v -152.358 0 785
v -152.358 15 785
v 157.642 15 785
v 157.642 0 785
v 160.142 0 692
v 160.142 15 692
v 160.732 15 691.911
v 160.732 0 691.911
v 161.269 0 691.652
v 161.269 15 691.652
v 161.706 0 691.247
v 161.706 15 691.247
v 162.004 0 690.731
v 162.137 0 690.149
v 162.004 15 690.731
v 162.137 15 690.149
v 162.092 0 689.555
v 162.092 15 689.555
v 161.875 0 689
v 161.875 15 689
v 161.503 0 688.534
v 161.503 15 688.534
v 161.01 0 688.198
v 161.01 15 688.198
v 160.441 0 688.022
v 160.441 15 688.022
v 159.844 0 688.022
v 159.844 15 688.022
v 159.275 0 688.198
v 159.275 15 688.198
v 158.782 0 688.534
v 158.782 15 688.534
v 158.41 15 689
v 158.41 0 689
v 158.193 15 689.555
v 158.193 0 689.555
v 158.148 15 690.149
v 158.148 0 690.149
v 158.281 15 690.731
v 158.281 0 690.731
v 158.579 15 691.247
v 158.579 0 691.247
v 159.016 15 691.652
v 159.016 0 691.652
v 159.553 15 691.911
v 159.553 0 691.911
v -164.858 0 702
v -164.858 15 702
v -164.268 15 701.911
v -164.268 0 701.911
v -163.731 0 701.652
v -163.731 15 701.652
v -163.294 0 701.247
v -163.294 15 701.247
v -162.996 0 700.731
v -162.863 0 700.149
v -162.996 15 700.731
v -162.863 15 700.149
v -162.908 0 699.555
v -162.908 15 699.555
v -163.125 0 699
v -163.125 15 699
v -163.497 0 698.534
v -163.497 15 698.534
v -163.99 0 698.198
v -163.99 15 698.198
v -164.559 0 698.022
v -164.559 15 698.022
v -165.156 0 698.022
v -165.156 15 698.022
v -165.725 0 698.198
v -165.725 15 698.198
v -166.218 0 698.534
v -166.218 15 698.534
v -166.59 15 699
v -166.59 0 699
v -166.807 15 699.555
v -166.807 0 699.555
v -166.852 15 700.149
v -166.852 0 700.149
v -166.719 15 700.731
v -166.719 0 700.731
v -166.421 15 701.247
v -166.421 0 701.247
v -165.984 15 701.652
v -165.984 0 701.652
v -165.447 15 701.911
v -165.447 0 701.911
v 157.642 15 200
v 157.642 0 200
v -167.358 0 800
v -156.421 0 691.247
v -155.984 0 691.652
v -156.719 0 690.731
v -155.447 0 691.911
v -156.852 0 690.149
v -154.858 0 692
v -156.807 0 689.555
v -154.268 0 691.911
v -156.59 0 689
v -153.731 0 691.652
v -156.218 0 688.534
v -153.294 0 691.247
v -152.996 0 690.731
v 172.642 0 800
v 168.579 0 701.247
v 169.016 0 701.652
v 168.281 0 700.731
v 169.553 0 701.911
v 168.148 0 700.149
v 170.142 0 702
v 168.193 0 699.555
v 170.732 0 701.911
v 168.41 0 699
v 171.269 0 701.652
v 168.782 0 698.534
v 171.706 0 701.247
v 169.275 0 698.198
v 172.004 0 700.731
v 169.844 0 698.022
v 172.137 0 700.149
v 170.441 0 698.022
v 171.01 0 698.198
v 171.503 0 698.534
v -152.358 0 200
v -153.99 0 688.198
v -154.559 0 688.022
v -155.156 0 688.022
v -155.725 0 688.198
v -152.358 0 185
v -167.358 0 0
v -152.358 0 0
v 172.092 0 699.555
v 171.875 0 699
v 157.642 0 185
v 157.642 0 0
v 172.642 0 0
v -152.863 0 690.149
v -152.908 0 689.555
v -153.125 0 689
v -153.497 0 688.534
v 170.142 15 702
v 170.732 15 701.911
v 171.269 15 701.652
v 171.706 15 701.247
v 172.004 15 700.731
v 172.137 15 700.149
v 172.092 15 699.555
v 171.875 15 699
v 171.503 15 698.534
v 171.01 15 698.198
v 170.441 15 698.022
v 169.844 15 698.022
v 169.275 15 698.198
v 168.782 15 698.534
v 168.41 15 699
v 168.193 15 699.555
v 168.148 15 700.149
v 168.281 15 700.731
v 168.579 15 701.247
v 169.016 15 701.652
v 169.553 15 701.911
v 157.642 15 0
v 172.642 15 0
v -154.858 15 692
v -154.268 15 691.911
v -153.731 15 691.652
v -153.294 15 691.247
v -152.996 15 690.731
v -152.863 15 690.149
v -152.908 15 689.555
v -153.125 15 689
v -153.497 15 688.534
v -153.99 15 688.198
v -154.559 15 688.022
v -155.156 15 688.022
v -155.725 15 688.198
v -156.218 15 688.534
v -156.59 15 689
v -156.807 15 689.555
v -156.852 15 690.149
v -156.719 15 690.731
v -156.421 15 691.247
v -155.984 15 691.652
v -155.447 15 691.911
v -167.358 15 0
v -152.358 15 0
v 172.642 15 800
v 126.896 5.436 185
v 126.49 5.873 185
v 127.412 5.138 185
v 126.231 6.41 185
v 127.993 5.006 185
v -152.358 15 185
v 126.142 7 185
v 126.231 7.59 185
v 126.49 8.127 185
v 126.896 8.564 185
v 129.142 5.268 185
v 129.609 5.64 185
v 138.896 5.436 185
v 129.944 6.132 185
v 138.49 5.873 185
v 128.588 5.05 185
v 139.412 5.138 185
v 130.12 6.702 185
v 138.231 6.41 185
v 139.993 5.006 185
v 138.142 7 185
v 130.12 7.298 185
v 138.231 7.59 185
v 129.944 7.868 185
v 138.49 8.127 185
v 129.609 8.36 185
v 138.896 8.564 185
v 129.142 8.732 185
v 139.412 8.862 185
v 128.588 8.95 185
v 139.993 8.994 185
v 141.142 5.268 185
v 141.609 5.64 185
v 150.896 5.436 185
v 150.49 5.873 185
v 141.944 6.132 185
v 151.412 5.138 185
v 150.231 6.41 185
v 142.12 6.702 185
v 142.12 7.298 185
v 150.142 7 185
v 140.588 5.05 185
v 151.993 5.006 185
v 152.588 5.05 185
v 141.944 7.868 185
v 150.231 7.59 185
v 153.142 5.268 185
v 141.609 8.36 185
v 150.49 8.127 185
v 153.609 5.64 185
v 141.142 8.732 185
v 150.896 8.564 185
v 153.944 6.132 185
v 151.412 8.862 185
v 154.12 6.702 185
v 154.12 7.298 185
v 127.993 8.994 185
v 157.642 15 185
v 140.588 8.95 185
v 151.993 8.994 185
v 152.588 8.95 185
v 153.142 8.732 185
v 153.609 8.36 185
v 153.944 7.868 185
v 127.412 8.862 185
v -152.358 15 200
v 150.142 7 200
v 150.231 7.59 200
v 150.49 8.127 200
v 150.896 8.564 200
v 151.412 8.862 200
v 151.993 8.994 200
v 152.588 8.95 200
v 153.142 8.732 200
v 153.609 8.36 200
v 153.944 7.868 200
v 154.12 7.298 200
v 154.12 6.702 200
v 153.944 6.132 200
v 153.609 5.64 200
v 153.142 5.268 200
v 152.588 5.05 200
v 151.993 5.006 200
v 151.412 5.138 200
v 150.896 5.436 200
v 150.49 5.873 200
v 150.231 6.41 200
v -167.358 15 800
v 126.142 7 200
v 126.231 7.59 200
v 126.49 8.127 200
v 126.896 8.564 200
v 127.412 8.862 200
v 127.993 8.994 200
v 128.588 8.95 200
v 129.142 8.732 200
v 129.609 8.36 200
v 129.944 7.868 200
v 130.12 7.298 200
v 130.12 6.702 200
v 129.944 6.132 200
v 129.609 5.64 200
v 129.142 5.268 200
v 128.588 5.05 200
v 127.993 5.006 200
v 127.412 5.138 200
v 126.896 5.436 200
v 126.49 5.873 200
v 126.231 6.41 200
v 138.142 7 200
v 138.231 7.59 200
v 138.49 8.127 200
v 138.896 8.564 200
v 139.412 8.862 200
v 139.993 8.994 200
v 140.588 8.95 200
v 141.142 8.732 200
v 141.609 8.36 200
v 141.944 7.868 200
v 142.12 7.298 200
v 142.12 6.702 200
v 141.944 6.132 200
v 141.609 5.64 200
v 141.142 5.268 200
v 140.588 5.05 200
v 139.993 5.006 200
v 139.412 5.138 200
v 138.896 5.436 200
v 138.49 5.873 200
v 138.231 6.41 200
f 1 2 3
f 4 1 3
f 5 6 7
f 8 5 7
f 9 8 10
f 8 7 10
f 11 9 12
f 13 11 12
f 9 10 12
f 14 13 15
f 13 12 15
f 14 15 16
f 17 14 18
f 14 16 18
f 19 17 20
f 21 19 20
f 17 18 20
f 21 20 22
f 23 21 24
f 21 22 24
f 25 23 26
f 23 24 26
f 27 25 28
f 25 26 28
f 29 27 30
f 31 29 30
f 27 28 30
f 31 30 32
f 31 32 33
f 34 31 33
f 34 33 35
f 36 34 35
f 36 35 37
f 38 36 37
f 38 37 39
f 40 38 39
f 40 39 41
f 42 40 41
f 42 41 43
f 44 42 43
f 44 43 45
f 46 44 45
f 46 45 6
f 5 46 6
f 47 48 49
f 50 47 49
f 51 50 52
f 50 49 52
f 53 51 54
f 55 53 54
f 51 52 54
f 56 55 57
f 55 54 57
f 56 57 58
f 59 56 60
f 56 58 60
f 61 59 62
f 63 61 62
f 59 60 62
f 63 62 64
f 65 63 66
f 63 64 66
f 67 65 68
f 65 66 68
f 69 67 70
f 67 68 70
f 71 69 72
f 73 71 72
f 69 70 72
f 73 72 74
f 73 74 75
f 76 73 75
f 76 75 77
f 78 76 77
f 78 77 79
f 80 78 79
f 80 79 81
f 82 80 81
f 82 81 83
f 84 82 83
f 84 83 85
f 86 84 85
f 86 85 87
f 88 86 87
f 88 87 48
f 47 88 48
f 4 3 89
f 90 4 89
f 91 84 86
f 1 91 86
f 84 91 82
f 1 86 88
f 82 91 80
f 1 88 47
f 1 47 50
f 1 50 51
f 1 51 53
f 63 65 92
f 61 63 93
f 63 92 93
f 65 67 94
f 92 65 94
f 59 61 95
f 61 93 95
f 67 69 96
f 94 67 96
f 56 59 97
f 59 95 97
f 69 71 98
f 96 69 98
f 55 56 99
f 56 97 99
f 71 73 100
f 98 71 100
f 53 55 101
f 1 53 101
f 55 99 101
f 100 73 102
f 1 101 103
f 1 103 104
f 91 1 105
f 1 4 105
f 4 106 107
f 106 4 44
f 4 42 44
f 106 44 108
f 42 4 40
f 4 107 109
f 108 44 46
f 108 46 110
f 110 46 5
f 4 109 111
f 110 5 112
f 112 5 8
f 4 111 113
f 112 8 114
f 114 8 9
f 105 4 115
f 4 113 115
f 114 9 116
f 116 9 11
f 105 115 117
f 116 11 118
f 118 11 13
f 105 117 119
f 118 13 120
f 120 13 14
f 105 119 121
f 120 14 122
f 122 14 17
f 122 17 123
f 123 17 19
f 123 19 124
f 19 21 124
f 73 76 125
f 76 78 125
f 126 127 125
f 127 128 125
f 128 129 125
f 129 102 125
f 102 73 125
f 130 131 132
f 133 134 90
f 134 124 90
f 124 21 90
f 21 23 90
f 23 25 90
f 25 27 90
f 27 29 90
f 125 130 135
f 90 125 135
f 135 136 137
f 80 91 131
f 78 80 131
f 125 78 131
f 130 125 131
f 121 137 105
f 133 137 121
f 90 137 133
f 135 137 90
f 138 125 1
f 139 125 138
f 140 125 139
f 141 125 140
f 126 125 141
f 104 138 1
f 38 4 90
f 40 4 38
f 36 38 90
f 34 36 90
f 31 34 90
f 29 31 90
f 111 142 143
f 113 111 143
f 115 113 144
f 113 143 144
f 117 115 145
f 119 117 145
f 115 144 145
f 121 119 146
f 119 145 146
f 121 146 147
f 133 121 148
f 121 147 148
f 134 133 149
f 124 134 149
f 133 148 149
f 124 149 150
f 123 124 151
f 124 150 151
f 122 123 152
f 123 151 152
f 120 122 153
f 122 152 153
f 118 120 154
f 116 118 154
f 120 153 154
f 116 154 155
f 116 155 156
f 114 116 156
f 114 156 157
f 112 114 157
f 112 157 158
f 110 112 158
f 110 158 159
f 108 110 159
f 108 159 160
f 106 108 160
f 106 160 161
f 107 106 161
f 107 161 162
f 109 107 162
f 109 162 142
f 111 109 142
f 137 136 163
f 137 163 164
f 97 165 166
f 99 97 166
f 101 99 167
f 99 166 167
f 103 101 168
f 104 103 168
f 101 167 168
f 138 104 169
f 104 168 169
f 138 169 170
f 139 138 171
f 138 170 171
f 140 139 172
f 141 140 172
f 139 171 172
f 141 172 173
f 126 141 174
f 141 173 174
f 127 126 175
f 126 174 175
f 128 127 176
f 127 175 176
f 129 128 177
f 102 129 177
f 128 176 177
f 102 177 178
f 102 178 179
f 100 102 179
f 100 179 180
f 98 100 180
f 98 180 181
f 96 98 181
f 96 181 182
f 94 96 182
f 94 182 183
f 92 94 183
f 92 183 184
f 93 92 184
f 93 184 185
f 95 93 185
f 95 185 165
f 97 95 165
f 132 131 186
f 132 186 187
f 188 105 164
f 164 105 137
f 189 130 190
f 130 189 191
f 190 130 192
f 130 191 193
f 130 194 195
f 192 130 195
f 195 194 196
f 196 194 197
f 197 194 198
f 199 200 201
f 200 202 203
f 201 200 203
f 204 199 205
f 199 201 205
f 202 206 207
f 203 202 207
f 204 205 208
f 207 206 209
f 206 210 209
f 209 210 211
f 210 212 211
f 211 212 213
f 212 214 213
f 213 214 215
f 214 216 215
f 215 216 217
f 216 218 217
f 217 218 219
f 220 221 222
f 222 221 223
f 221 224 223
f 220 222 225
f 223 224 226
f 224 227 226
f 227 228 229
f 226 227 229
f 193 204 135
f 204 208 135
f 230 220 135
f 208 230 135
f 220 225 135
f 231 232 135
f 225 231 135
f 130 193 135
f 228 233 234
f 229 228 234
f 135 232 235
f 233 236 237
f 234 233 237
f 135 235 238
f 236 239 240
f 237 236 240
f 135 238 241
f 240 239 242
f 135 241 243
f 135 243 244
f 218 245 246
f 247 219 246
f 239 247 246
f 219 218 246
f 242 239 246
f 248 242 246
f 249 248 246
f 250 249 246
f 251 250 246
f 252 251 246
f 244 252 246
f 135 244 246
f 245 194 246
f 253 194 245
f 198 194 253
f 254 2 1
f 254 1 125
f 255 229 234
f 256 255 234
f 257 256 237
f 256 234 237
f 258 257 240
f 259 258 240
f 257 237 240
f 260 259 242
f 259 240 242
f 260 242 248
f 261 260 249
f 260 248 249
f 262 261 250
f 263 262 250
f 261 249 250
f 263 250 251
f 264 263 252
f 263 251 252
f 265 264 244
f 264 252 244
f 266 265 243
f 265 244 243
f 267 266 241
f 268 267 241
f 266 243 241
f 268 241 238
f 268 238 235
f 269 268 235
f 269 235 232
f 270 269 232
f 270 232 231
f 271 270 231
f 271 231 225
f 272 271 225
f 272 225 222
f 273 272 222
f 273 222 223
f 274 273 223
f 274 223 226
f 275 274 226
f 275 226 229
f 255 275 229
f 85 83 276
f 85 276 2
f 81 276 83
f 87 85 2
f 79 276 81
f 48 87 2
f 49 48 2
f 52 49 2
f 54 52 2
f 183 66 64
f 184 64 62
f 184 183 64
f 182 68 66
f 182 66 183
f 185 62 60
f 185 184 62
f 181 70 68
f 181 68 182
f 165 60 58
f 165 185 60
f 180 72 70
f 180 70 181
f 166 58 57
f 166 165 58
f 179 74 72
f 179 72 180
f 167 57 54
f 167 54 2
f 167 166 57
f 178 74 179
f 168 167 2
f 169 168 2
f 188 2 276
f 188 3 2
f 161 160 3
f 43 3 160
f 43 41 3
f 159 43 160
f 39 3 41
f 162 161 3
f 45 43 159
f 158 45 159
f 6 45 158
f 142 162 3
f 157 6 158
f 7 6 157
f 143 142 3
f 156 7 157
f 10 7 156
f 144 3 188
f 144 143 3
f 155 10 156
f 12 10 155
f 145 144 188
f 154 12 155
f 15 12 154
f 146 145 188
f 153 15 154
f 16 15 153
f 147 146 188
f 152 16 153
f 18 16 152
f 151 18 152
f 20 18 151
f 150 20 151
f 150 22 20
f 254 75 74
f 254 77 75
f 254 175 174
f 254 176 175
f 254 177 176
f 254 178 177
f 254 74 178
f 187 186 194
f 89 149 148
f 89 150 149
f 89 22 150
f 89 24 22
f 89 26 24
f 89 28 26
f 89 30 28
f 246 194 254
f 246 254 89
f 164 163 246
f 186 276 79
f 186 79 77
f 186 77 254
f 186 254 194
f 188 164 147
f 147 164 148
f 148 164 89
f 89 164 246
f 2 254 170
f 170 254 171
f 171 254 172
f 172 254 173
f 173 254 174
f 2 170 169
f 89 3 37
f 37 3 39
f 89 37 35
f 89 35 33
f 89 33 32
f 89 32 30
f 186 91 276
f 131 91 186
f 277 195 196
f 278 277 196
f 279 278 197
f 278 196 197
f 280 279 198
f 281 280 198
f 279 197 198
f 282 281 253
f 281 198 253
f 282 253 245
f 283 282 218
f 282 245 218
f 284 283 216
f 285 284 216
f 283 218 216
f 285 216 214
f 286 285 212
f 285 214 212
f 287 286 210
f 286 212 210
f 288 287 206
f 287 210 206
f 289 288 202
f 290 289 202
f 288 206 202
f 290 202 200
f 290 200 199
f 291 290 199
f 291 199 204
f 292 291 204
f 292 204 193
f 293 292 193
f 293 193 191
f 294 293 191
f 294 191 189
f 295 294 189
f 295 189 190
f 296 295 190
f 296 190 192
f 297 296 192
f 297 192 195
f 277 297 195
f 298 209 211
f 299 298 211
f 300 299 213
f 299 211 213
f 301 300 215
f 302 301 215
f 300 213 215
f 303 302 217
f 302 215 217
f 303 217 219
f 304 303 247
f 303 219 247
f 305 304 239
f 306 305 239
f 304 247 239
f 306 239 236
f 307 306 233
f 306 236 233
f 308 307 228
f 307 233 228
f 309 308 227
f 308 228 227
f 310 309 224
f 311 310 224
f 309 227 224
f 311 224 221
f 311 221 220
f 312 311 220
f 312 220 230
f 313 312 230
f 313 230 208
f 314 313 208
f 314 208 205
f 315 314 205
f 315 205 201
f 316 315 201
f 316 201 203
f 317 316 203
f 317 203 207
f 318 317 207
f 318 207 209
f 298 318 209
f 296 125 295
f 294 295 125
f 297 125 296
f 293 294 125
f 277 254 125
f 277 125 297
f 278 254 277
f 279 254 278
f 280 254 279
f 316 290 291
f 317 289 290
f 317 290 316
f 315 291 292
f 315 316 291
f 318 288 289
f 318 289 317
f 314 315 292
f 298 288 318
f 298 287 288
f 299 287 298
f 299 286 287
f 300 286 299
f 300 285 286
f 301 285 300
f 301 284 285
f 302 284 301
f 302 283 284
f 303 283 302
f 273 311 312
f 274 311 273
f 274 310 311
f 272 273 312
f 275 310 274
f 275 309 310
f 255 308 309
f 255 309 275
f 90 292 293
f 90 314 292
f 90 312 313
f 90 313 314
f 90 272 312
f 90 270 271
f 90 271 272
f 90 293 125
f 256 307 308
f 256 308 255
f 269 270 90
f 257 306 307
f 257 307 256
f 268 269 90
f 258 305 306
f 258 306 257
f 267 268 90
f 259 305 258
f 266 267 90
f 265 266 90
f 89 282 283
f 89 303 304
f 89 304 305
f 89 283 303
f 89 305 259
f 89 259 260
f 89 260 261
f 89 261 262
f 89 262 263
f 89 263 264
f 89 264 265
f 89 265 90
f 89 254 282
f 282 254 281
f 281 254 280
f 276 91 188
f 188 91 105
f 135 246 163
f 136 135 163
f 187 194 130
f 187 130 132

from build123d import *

# Parameters (mm, degrees)
SKETCH_2_W          = 340
SKETCH_2_H          = 800
EXTRUDE_1_DEPTH     = 15
SKETCH_3_W          = 310
SKETCH_3_H          = 785
CUT_EXTRUDE_1_DEPTH = 15
SKETCH_8_W          = 310
SKETCH_8_H          = 15
EXTRUDE_3_DEPTH     = 15
CUT_EXTRUDE_5_REACH = 640.949
SKETCH_10_R         = 2
SKETCH_11_R         = 2
CUT_EXTRUDE_6_DEPTH = 819.553864039


with BuildPart() as part:
    # 草图2 → 凸台-拉伸1 (new body)
    with BuildSketch(Plane(origin=(0, 0, 0), x_dir=(1, 0, 0), z_dir=(0, 1, 0))):
        with Locations((2.642487047, -400)):
            Rectangle(SKETCH_2_W, SKETCH_2_H)
    extrude(amount=EXTRUDE_1_DEPTH)

    # 草图3 → 切除-拉伸1 (cut)
    with BuildSketch(Plane(origin=(0, 15, 0), x_dir=(1, 0, 0), z_dir=(0, 1, 0))):
        with Locations((2.642487047, -392.5)):
            Rectangle(SKETCH_3_W, SKETCH_3_H)
    extrude(amount=-CUT_EXTRUDE_1_DEPTH, mode=Mode.SUBTRACT)

    # 草图8 → 凸台-拉伸3 (add)
    with BuildSketch(Plane(origin=(0, 15, 0), x_dir=(1, 0, 0), z_dir=(0, 1, 0))):
        with Locations((2.642487047, -192.5)):
            Rectangle(SKETCH_8_W, SKETCH_8_H)
    extrude(amount=-EXTRUDE_3_DEPTH)

    # 草图10 → 切除-拉伸5 (cut, up to next)
    with BuildSketch(Plane(origin=(0, 0, 185), x_dir=(-1, 0, 0), z_dir=(0, 0, -1)), mode=Mode.PRIVATE) as cut_extrude_5_sk1:
        with Locations((-152.142487047, 7)):
            Circle(SKETCH_10_R)
    cut_extrude_5_tool1 = extrude(cut_extrude_5_sk1.sketch, amount=-CUT_EXTRUDE_5_REACH, mode=Mode.PRIVATE) & part.part
    # 草图10 → 切除-拉伸5 (cut, up to next)
    with BuildSketch(Plane(origin=(0, 0, 185), x_dir=(-1, 0, 0), z_dir=(0, 0, -1)), mode=Mode.PRIVATE) as cut_extrude_5_sk2:
        with Locations((-140.142487047, 7)):
            Circle(SKETCH_10_R)
    cut_extrude_5_tool2 = extrude(cut_extrude_5_sk2.sketch, amount=-CUT_EXTRUDE_5_REACH, mode=Mode.PRIVATE) & part.part
    # 草图10 → 切除-拉伸5 (cut, up to next)
    with BuildSketch(Plane(origin=(0, 0, 185), x_dir=(-1, 0, 0), z_dir=(0, 0, -1)), mode=Mode.PRIVATE) as cut_extrude_5_sk3:
        with Locations((-128.142487047, 7)):
            Circle(SKETCH_10_R)
    cut_extrude_5_tool3 = extrude(cut_extrude_5_sk3.sketch, amount=-CUT_EXTRUDE_5_REACH, mode=Mode.PRIVATE) & part.part
    add(cut_extrude_5_tool1.solids().sort_by_distance((152.142487, 7, 185))[0], mode=Mode.SUBTRACT)
    add(cut_extrude_5_tool2.solids().sort_by_distance((140.142487, 7, 185))[0], mode=Mode.SUBTRACT)
    add(cut_extrude_5_tool3.solids().sort_by_distance((128.142487, 7, 185))[0], mode=Mode.SUBTRACT)

    # 草图11 → 切除-拉伸6 (cut, through all)
    with BuildSketch(Plane(origin=(0, 15, 0), x_dir=(1, 0, 0), z_dir=(0, 1, 0))):
        with Locations(Location((160.142487047, -690, 0), (0, 0, 270))):
            Circle(SKETCH_11_R)
        with Locations(Location((170.142487047, -700, 0), (0, 0, 270))):
            Circle(SKETCH_11_R)
        with Locations(Location((-154.857512953, -690, 0), (0, 0, 270))):
            Circle(SKETCH_11_R)
        with Locations(Location((-164.857512953, -700, 0), (0, 0, 270))):
            Circle(SKETCH_11_R)
    extrude(amount=-CUT_EXTRUDE_6_DEPTH, mode=Mode.SUBTRACT)


solid = part.part
